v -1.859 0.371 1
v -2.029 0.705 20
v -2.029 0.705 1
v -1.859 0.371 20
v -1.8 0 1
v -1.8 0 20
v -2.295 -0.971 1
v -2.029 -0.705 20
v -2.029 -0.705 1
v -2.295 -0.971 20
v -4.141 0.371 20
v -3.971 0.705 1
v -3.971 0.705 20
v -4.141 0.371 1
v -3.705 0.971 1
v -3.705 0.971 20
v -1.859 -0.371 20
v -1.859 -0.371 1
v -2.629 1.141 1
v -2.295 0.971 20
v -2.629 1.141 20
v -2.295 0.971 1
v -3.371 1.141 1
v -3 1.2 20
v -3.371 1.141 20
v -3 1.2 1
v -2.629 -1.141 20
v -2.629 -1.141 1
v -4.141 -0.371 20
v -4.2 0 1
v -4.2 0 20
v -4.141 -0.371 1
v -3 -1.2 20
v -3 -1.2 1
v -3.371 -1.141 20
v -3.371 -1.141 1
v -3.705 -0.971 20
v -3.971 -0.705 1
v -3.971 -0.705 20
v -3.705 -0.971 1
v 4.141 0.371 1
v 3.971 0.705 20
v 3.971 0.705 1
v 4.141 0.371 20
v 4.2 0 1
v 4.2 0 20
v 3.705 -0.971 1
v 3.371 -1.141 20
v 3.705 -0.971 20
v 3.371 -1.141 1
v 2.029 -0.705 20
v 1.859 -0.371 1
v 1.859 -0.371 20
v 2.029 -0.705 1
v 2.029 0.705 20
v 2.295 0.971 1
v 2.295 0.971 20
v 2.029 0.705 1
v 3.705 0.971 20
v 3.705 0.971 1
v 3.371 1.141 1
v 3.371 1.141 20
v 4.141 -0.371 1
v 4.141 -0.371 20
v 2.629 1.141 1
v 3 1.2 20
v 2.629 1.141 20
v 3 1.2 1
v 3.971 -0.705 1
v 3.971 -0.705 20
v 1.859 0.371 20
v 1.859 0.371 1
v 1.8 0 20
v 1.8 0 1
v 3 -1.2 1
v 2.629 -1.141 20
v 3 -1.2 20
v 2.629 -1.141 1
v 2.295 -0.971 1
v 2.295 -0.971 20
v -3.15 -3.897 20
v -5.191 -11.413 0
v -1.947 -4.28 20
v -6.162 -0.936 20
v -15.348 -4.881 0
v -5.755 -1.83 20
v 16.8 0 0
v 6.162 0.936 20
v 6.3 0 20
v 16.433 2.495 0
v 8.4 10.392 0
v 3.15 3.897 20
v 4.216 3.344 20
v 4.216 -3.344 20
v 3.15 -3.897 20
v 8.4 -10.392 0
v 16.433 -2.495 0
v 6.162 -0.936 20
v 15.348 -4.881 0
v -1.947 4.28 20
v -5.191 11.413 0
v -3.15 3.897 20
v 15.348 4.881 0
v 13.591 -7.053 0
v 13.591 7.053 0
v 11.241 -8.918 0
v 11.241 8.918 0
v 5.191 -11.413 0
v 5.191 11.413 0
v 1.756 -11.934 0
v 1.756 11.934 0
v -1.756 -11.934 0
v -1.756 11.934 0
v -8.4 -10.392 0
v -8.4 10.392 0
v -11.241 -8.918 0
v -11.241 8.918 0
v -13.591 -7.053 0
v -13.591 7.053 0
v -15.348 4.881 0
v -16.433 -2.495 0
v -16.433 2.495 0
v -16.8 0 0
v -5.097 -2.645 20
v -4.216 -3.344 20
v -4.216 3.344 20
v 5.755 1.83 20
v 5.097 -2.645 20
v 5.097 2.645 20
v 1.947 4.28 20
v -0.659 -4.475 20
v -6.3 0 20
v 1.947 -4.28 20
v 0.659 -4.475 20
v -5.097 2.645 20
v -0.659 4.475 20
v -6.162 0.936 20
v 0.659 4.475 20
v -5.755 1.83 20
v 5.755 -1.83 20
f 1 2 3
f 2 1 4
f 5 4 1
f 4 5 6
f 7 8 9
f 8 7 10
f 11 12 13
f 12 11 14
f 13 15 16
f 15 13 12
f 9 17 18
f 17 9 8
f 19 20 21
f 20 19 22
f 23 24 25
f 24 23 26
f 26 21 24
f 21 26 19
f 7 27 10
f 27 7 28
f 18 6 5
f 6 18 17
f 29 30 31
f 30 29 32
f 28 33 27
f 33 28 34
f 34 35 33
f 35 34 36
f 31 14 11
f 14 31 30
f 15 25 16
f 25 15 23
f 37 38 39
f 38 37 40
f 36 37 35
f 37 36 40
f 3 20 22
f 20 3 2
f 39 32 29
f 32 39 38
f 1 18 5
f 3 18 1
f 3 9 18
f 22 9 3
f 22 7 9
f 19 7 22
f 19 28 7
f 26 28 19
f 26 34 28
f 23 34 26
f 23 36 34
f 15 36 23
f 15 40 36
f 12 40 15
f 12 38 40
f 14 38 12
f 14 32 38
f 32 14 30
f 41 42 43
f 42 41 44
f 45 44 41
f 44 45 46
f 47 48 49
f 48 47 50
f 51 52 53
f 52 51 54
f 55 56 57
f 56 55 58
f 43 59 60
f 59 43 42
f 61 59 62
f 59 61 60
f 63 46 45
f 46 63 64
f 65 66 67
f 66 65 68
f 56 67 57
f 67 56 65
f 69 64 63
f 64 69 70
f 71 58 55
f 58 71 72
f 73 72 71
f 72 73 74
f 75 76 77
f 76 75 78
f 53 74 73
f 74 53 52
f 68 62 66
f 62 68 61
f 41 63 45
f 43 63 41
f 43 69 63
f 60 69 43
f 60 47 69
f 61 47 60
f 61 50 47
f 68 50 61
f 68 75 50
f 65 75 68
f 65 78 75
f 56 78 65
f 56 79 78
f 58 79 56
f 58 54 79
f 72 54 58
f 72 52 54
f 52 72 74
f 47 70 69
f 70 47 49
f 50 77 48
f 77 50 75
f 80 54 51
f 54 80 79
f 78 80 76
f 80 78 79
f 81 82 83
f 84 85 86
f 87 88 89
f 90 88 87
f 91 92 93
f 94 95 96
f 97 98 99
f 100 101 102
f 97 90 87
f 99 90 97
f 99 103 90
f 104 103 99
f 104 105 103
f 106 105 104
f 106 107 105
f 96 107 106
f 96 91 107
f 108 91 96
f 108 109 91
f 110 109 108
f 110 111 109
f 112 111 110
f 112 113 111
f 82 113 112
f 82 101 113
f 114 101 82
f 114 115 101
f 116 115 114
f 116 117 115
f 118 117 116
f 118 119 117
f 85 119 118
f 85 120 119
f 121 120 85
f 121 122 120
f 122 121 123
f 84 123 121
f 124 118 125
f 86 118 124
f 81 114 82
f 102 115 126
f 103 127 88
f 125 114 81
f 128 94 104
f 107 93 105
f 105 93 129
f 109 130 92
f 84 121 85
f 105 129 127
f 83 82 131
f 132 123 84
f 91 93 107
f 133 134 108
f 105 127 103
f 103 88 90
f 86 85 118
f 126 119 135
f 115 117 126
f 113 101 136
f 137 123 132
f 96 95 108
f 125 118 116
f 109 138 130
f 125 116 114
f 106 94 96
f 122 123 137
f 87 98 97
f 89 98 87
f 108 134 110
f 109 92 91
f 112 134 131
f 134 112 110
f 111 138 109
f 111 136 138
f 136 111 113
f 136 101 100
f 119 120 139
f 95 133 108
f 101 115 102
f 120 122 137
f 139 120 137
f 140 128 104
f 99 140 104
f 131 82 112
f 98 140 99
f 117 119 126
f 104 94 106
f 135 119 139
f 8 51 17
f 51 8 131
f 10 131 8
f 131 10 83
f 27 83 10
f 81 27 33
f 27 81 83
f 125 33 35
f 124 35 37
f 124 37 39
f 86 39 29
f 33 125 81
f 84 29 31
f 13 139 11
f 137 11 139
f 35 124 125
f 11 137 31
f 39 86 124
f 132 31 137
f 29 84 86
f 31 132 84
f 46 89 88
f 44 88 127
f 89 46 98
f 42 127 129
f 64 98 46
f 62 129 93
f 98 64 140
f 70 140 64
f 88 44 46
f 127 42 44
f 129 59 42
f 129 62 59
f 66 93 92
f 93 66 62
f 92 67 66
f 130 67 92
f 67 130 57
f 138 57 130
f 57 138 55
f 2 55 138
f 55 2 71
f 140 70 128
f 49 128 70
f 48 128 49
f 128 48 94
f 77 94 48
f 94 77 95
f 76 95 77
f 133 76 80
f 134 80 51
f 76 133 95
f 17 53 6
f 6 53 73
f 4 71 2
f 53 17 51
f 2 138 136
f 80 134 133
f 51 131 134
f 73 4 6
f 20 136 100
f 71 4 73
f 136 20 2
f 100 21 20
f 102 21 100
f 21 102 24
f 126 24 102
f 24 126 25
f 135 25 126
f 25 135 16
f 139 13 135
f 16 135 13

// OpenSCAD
// Author    KMS - Martin Dubois, P.Eng.
// Copyright (C) 2021 KMS
// Product   EthCAN
// File      Hardware/Tool_Prog.scad

difference()
{
    scale( [ 1.4, 1, 1 ] )
        cylinder( SIZE_Z, 12, 4.5, $fn = 30 );

    for ( x = [ - 3, 3 ] )
    {
        translate( [ x, 0, 1 ] )
            cylinder( SIZE_Z - 1 + EPS, 1.2, 1.2, $fn = 20 );
    }
}

// Private
/////////////////////////////////////////////////////////////////////////////

EPS = 0.1;

SIZE_Z = 20;
